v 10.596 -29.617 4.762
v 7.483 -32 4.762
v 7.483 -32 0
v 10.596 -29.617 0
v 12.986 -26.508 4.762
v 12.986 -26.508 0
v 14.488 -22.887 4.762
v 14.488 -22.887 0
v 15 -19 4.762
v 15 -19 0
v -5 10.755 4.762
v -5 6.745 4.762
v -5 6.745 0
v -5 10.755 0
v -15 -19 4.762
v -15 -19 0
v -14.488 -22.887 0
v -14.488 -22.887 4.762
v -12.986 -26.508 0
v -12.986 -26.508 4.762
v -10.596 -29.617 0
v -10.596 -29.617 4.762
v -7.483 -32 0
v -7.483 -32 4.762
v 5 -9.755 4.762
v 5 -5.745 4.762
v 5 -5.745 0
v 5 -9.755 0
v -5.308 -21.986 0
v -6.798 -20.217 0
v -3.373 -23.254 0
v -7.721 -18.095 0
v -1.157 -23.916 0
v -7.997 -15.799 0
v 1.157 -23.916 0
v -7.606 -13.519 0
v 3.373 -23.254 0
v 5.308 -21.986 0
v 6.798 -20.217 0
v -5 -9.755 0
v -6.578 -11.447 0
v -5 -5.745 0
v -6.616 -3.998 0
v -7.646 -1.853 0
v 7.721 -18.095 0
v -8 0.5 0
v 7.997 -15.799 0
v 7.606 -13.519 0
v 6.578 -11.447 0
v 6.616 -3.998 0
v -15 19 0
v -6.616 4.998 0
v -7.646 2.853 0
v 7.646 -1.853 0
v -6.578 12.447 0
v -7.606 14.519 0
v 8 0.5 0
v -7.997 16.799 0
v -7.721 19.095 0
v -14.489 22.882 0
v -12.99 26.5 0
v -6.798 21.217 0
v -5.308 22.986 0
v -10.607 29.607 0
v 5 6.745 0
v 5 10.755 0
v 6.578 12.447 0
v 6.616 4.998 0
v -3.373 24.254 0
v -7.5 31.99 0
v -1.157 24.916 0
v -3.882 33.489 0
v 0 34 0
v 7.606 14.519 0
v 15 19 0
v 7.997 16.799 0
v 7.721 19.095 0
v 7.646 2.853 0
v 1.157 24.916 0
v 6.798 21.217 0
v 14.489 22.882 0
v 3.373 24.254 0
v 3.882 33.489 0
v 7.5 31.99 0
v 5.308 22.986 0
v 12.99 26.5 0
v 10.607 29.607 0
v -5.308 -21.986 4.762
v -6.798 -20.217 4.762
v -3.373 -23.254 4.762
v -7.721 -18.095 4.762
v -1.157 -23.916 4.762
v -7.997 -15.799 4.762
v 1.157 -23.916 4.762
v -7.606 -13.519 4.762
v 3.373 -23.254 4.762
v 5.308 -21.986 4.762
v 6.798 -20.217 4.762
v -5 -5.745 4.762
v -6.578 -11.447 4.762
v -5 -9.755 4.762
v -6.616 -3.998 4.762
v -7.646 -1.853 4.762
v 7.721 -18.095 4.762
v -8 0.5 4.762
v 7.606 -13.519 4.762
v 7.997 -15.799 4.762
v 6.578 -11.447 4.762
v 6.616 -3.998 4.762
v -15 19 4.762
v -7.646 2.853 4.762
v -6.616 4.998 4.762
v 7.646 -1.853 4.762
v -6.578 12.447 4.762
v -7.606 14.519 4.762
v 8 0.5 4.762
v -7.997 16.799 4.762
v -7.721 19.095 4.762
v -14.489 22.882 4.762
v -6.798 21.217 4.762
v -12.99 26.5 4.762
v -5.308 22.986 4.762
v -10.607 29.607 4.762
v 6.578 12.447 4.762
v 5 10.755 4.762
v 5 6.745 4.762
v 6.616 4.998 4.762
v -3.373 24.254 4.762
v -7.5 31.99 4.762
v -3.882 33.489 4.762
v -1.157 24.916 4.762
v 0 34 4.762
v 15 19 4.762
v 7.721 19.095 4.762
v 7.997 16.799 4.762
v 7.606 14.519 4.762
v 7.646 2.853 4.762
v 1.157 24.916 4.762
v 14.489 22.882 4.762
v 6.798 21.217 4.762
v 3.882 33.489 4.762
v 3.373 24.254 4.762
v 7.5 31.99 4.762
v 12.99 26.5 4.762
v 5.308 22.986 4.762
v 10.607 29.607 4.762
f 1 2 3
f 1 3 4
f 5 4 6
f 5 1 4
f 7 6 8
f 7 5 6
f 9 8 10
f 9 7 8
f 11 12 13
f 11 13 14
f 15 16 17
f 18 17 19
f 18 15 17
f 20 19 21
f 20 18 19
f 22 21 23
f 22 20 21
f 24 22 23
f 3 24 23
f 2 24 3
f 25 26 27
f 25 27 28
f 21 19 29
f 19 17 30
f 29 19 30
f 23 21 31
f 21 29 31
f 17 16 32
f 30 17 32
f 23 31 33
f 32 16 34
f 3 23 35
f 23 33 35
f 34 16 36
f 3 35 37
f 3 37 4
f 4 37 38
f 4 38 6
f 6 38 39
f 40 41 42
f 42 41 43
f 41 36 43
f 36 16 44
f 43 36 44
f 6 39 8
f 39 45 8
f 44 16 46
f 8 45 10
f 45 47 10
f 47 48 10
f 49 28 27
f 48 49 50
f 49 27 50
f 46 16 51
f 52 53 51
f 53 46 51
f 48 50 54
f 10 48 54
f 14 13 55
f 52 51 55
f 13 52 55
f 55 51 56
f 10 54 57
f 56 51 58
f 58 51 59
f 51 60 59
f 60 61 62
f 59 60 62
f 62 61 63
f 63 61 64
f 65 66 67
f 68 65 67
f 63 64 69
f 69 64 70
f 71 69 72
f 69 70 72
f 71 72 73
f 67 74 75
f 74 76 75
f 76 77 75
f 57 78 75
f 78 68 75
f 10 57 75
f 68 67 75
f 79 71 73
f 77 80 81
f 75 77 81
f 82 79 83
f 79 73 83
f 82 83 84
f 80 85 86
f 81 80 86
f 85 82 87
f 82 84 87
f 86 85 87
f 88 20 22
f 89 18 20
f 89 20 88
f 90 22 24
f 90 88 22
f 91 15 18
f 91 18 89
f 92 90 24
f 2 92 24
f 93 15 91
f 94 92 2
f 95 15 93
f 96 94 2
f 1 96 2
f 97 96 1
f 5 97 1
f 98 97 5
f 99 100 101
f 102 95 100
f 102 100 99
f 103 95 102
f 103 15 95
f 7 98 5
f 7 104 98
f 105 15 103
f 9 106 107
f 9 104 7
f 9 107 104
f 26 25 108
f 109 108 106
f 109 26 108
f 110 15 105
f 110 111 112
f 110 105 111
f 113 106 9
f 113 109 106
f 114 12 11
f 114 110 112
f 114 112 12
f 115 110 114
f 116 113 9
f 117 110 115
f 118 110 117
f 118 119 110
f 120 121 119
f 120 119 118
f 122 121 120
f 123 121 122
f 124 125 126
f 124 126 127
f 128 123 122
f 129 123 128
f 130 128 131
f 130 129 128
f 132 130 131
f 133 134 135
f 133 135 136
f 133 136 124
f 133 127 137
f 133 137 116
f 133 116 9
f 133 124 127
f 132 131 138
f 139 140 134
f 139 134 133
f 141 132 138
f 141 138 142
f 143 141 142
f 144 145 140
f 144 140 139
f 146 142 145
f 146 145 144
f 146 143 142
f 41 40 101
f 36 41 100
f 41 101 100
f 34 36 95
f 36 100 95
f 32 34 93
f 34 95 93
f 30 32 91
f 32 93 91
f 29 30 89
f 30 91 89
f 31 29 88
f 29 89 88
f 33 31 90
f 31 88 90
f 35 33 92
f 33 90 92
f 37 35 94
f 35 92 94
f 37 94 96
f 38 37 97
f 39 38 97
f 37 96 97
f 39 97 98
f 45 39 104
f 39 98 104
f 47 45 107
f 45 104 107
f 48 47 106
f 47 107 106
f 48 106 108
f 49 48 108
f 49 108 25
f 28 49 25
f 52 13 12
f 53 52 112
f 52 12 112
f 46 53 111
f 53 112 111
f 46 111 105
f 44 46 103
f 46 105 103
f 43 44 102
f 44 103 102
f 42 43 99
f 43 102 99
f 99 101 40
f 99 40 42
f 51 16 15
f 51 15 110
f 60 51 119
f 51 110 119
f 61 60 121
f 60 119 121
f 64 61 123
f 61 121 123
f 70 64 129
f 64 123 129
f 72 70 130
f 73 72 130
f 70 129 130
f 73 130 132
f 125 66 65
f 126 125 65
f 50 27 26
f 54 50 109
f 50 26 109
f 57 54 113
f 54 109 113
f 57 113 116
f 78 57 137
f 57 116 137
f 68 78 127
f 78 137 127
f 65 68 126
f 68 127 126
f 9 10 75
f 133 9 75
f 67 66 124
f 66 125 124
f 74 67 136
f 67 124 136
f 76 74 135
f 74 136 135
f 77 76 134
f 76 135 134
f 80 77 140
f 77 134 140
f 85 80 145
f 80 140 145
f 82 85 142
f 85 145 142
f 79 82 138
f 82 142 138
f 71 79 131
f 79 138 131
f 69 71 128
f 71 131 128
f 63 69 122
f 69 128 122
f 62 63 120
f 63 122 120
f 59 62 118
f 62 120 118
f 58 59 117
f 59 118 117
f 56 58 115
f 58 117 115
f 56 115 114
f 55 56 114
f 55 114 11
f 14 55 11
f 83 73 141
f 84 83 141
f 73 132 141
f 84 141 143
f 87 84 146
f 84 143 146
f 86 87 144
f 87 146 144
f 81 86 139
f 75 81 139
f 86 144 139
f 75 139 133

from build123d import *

# Parameters (mm, degrees)
CROQUIS1_W              = 30
CROQUIS1_H              = 68
SALIENTE_EXTRUIR1_DEPTH = 4.7625
REDONDEO1_R             = 15
CROQUIS2_R              = 8
CORTAR_EXTRUIR1_DEPTH   = 10
CROQUIS3_W              = 31.404872341
CROQUIS3_H              = 7.197905048
CORTAR_EXTRUIR2_DEPTH   = 10


with BuildPart() as part:
    # Croquis1 → Saliente-Extruir1 (new body)
    with BuildSketch(Plane.XY):
        Rectangle(CROQUIS1_W, CROQUIS1_H)
        with BuildLine():
            Line((5, 14), (5, -14))
            ThreePointArc((5, -14), (0, -19), (-5, -14))
            Line((-5, -14), (-5, 14))
            ThreePointArc((-5, 14), (0, 19), (5, 14))
        make_face(mode=Mode.SUBTRACT)
    extrude(amount=SALIENTE_EXTRUIR1_DEPTH)

    # Redondeo1
    redondeo1_edges = [part.edges().sort_by_distance(p)[0] for p in [
        (15, -34, 2.38125),
        (-15, -34, 2.38125),
        (-15, 34, 2.38125),
        (15, 34, 2.38125),
    ]]
    fillet(redondeo1_edges, radius=REDONDEO1_R - 0.0001)  # a hair under: the kernel refuses the full size

    # Croquis2 → Cortar-Extruir1 (cut)
    with BuildSketch(Plane.XY.offset(4.7625)):
        with Locations((0, 17)):
            Circle(CROQUIS2_R)
        with Locations((0, 0.5)):
            Circle(CROQUIS2_R)
        with Locations((0, -16)):
            Circle(CROQUIS2_R)
    extrude(amount=-CORTAR_EXTRUIR1_DEPTH, mode=Mode.SUBTRACT)

    # Croquis3 → Cortar-Extruir2 (cut)
    with BuildSketch(Plane.XY.offset(4.7625)):
        with Locations((0.058431815, -35.598952524)):
            Rectangle(CROQUIS3_W, CROQUIS3_H)
    extrude(amount=-CORTAR_EXTRUIR2_DEPTH, mode=Mode.SUBTRACT)


solid = part.part
